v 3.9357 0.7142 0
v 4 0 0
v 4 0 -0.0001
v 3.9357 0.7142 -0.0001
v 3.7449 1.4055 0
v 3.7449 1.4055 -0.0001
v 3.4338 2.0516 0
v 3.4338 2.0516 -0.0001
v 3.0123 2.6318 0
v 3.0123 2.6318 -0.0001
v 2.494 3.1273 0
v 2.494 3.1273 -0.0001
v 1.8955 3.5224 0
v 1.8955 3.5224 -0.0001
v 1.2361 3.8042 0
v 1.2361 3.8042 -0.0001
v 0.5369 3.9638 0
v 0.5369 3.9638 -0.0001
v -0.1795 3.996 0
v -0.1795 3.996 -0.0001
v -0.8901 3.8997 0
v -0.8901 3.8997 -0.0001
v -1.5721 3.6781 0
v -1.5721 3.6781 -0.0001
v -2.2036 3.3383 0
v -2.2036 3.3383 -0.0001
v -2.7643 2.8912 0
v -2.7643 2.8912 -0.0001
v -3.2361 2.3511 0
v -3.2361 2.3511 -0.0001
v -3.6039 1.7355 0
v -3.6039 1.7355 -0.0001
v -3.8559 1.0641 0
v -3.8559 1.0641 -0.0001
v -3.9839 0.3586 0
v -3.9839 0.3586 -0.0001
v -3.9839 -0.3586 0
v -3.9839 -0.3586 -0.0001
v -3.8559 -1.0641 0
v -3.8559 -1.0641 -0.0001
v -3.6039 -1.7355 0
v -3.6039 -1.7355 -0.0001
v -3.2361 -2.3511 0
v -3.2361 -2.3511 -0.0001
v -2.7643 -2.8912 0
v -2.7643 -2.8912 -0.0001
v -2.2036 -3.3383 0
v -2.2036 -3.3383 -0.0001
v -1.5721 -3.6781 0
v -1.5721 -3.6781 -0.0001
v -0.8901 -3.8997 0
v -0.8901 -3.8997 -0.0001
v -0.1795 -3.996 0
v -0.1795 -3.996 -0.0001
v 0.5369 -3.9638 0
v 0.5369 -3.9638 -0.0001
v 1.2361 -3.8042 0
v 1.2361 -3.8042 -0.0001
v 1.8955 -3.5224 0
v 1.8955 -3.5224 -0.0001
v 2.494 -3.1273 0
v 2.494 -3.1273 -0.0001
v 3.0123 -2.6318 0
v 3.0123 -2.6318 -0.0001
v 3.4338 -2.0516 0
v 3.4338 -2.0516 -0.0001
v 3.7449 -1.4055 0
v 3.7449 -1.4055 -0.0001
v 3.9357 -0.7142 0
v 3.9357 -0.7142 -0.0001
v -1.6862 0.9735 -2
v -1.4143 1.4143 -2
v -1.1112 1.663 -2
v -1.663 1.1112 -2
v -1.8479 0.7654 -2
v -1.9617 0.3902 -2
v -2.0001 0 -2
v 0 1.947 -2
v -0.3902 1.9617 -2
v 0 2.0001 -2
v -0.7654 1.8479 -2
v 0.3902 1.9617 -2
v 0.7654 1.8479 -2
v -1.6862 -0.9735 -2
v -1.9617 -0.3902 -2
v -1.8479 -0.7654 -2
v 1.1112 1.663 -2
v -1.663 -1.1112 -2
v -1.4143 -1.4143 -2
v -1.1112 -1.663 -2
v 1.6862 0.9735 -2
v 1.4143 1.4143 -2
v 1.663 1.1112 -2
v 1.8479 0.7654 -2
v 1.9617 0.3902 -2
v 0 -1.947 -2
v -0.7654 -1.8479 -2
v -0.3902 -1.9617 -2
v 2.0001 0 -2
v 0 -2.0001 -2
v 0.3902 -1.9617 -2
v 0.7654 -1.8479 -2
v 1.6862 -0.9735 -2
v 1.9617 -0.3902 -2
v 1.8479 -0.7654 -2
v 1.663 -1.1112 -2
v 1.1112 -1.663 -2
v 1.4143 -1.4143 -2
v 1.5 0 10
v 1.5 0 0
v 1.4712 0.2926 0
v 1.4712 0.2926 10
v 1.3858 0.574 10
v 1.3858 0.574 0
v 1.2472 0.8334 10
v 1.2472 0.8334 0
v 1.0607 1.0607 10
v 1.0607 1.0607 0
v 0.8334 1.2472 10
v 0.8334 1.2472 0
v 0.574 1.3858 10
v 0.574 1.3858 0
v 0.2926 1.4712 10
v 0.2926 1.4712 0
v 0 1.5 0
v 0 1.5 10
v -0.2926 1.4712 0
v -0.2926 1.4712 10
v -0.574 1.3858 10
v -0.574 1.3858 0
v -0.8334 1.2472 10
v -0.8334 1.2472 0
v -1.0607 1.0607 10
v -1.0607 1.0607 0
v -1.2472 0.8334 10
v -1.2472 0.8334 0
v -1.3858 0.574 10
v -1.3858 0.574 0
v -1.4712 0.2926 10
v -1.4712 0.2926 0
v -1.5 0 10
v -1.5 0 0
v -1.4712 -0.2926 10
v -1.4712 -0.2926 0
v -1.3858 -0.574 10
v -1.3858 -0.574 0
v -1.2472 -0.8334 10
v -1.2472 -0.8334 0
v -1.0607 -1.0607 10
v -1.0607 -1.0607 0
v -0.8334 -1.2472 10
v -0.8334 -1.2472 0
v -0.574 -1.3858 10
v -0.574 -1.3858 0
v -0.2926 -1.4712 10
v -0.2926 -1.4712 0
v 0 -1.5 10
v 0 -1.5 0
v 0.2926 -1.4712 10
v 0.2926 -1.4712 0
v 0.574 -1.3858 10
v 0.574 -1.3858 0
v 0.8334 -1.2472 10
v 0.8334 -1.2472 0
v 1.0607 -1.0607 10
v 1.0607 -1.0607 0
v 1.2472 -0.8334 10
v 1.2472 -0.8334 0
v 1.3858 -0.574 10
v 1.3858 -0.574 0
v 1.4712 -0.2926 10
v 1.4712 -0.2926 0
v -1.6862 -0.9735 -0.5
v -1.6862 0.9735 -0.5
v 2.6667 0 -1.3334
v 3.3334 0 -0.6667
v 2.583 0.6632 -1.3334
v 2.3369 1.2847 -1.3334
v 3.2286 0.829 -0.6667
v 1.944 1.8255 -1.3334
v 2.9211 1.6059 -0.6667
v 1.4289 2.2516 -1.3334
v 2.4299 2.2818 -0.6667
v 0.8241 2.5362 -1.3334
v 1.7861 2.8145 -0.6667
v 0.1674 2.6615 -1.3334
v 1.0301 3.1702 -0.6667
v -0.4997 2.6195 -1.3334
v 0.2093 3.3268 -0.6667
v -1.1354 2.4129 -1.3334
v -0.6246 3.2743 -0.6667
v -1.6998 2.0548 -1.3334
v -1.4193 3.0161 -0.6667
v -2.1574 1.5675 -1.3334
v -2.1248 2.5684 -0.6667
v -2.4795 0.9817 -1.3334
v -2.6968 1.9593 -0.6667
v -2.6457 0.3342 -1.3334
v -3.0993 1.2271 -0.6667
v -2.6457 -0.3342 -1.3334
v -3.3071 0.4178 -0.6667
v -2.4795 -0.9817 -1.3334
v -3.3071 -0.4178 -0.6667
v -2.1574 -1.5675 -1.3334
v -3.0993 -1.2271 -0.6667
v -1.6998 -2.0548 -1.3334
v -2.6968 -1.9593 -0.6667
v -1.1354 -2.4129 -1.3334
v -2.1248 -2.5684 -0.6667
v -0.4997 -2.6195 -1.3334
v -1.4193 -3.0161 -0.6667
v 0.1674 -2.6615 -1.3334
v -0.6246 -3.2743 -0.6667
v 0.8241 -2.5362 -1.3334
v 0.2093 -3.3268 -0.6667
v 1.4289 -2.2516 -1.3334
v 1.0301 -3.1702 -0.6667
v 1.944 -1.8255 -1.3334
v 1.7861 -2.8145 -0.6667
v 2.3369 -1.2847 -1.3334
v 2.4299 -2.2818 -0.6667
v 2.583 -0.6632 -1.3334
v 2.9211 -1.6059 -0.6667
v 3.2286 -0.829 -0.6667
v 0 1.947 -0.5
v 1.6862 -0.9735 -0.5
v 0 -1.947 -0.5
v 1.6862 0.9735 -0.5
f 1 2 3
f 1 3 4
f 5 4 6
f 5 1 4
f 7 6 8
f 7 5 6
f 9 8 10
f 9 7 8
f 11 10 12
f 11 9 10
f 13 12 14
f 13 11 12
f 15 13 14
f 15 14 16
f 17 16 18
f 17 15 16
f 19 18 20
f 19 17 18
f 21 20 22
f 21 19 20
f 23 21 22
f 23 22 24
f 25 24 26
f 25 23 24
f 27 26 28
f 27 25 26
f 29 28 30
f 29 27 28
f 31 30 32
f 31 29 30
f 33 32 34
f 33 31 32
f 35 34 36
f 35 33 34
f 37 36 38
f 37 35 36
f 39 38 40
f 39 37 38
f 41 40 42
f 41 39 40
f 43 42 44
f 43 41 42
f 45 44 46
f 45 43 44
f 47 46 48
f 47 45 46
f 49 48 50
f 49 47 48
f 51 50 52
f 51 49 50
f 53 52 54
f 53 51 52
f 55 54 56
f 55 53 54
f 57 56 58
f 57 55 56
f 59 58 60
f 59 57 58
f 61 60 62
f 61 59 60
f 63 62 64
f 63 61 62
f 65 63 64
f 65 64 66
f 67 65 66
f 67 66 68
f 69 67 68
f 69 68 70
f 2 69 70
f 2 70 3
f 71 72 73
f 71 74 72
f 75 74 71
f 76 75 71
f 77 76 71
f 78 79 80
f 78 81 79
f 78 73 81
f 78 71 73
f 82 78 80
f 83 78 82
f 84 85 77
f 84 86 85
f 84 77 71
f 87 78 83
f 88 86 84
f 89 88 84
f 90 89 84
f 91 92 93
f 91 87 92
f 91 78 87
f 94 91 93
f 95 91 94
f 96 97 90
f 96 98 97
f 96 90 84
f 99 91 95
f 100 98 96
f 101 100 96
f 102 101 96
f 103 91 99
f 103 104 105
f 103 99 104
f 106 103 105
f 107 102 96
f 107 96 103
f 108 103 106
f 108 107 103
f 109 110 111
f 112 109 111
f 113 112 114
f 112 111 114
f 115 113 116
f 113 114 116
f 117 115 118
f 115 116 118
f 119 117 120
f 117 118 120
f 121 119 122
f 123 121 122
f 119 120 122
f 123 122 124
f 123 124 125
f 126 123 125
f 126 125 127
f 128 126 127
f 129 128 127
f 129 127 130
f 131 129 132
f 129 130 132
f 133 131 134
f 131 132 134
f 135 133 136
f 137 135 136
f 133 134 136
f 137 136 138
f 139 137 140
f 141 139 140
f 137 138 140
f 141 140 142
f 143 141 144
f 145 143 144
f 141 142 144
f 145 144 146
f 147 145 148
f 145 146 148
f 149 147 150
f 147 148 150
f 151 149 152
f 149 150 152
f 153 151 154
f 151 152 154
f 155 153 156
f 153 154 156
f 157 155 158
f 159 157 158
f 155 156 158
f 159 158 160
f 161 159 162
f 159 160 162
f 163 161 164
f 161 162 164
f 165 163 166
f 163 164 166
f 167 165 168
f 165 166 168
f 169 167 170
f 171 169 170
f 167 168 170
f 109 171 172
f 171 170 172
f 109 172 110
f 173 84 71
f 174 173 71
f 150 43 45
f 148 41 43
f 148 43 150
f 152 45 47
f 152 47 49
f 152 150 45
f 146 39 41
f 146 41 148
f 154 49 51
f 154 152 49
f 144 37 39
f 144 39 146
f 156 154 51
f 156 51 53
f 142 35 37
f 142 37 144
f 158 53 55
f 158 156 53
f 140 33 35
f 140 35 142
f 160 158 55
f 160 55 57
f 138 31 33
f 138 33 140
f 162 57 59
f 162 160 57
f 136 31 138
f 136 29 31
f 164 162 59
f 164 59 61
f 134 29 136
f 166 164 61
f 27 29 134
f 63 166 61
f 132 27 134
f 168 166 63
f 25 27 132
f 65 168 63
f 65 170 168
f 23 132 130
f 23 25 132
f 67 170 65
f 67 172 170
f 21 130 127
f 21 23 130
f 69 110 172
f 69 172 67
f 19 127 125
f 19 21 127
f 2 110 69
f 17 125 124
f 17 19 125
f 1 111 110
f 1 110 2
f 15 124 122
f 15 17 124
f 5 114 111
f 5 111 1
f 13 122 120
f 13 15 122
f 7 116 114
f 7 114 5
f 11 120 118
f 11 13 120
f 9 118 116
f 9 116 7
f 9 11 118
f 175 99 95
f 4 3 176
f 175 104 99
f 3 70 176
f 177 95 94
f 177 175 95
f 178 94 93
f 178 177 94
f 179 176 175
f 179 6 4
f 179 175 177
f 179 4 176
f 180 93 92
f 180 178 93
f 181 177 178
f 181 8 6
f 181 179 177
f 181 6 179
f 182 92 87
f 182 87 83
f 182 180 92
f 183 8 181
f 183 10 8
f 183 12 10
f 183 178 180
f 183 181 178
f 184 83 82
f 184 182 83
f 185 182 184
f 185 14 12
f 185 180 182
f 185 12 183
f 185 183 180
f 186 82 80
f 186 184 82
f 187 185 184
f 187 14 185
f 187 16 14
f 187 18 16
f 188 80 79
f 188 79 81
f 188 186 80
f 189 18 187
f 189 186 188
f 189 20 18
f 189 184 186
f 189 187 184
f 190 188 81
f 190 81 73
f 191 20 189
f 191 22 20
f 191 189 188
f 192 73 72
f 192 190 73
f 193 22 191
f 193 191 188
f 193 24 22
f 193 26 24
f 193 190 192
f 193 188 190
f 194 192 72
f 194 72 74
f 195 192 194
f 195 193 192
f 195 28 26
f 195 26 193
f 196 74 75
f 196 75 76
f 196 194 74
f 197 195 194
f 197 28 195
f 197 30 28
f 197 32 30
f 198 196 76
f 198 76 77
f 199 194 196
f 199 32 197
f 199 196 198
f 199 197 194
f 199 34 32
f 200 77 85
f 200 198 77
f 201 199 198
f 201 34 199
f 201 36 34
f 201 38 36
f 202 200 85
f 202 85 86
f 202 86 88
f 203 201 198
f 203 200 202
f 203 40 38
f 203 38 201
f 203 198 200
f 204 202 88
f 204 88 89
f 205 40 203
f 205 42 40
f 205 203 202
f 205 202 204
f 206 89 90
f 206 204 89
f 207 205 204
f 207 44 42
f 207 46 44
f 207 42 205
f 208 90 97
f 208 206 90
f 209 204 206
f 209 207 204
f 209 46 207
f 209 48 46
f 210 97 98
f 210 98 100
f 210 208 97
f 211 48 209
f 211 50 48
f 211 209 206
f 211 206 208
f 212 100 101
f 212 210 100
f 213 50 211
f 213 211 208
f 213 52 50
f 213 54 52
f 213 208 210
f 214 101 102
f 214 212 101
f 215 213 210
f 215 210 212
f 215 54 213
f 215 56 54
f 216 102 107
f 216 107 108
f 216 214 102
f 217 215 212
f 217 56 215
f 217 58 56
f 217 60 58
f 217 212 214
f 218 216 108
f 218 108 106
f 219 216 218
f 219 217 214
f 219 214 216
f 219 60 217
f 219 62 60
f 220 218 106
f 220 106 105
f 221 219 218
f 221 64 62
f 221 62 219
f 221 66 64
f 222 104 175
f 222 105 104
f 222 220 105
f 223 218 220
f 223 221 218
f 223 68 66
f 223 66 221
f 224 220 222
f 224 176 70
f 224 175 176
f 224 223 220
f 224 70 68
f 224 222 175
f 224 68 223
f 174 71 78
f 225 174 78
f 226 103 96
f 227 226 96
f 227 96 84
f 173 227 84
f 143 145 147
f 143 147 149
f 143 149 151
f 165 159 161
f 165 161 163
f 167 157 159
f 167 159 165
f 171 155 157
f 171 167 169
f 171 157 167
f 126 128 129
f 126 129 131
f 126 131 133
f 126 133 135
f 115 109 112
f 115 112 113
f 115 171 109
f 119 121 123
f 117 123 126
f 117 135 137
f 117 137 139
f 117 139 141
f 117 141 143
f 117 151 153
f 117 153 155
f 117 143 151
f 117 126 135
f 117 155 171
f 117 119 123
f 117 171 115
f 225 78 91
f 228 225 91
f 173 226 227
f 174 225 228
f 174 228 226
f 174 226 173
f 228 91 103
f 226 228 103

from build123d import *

# Parameters (mm, degrees)
SKETCH1_R           = 1.5
BOSS_EXTRUDE2_DEPTH = 10
SKETCH1_8_R         = 4
SKETCH1_8_R_2       = 1.5
BOSS_EXTRUDE4_DEPTH = 2
BOSS_EXTRUDE5_START = 2
SKETCH2_R           = 1.5
BOSS_EXTRUDE5_DEPTH = 2
CUT_EXTRUDE2_DEPTH  = 1.5
CHAMFER1_SIZE       = 2


with BuildPart() as part:
    # Sketch1 → Boss-Extrude2 (new body)
    with BuildSketch(Plane.XY):
        Circle(SKETCH1_R)
    extrude(amount=BOSS_EXTRUDE2_DEPTH)



with BuildPart() as body_2:
    # Sketch1<8> → Boss-Extrude4 (new body)
    with BuildSketch(Plane.XY):
        Circle(SKETCH1_8_R)
        Circle(SKETCH1_8_R_2, mode=Mode.SUBTRACT)
    extrude(amount=-BOSS_EXTRUDE4_DEPTH)


with BuildPart() as part_1:
    add(part.part)

    add(body_2.part)  # Boss-Extrude5 merges body 2
    # Sketch2 → Boss-Extrude5 (add)
    with BuildSketch(Plane(origin=(0, 0, 0), x_dir=(-1, 0, 0), z_dir=(0, 0, -1)).offset(BOSS_EXTRUDE5_START)):
        with Locations(Location((0, 0, 0), (0, 0, 180))):
            Circle(SKETCH2_R)
    extrude(amount=-BOSS_EXTRUDE5_DEPTH)

    # Sketch3 → Cut-Extrude2 (cut)
    with BuildSketch(Plane(origin=(0, 0, -2), x_dir=(-1, 0, 0), z_dir=(0, 0, -1))):
        Polygon((0, 1.947036768), (-1.686183303, 0.973518384), (-1.686183303, -0.973518384), (0, -1.947036768), (1.686183303, -0.973518384), (1.686183303, 0.973518384), align=None)
    extrude(amount=-CUT_EXTRUDE2_DEPTH, mode=Mode.SUBTRACT)

    # Chamfer1
    chamfer1_edges = [part_1.edges().sort_by_distance(p)[0] for p in [
        (-4, 0, -2),
    ]]
    chamfer(chamfer1_edges, length=CHAMFER1_SIZE - 0.0001)  # a hair under: the kernel refuses the full size


solid = part_1.part
